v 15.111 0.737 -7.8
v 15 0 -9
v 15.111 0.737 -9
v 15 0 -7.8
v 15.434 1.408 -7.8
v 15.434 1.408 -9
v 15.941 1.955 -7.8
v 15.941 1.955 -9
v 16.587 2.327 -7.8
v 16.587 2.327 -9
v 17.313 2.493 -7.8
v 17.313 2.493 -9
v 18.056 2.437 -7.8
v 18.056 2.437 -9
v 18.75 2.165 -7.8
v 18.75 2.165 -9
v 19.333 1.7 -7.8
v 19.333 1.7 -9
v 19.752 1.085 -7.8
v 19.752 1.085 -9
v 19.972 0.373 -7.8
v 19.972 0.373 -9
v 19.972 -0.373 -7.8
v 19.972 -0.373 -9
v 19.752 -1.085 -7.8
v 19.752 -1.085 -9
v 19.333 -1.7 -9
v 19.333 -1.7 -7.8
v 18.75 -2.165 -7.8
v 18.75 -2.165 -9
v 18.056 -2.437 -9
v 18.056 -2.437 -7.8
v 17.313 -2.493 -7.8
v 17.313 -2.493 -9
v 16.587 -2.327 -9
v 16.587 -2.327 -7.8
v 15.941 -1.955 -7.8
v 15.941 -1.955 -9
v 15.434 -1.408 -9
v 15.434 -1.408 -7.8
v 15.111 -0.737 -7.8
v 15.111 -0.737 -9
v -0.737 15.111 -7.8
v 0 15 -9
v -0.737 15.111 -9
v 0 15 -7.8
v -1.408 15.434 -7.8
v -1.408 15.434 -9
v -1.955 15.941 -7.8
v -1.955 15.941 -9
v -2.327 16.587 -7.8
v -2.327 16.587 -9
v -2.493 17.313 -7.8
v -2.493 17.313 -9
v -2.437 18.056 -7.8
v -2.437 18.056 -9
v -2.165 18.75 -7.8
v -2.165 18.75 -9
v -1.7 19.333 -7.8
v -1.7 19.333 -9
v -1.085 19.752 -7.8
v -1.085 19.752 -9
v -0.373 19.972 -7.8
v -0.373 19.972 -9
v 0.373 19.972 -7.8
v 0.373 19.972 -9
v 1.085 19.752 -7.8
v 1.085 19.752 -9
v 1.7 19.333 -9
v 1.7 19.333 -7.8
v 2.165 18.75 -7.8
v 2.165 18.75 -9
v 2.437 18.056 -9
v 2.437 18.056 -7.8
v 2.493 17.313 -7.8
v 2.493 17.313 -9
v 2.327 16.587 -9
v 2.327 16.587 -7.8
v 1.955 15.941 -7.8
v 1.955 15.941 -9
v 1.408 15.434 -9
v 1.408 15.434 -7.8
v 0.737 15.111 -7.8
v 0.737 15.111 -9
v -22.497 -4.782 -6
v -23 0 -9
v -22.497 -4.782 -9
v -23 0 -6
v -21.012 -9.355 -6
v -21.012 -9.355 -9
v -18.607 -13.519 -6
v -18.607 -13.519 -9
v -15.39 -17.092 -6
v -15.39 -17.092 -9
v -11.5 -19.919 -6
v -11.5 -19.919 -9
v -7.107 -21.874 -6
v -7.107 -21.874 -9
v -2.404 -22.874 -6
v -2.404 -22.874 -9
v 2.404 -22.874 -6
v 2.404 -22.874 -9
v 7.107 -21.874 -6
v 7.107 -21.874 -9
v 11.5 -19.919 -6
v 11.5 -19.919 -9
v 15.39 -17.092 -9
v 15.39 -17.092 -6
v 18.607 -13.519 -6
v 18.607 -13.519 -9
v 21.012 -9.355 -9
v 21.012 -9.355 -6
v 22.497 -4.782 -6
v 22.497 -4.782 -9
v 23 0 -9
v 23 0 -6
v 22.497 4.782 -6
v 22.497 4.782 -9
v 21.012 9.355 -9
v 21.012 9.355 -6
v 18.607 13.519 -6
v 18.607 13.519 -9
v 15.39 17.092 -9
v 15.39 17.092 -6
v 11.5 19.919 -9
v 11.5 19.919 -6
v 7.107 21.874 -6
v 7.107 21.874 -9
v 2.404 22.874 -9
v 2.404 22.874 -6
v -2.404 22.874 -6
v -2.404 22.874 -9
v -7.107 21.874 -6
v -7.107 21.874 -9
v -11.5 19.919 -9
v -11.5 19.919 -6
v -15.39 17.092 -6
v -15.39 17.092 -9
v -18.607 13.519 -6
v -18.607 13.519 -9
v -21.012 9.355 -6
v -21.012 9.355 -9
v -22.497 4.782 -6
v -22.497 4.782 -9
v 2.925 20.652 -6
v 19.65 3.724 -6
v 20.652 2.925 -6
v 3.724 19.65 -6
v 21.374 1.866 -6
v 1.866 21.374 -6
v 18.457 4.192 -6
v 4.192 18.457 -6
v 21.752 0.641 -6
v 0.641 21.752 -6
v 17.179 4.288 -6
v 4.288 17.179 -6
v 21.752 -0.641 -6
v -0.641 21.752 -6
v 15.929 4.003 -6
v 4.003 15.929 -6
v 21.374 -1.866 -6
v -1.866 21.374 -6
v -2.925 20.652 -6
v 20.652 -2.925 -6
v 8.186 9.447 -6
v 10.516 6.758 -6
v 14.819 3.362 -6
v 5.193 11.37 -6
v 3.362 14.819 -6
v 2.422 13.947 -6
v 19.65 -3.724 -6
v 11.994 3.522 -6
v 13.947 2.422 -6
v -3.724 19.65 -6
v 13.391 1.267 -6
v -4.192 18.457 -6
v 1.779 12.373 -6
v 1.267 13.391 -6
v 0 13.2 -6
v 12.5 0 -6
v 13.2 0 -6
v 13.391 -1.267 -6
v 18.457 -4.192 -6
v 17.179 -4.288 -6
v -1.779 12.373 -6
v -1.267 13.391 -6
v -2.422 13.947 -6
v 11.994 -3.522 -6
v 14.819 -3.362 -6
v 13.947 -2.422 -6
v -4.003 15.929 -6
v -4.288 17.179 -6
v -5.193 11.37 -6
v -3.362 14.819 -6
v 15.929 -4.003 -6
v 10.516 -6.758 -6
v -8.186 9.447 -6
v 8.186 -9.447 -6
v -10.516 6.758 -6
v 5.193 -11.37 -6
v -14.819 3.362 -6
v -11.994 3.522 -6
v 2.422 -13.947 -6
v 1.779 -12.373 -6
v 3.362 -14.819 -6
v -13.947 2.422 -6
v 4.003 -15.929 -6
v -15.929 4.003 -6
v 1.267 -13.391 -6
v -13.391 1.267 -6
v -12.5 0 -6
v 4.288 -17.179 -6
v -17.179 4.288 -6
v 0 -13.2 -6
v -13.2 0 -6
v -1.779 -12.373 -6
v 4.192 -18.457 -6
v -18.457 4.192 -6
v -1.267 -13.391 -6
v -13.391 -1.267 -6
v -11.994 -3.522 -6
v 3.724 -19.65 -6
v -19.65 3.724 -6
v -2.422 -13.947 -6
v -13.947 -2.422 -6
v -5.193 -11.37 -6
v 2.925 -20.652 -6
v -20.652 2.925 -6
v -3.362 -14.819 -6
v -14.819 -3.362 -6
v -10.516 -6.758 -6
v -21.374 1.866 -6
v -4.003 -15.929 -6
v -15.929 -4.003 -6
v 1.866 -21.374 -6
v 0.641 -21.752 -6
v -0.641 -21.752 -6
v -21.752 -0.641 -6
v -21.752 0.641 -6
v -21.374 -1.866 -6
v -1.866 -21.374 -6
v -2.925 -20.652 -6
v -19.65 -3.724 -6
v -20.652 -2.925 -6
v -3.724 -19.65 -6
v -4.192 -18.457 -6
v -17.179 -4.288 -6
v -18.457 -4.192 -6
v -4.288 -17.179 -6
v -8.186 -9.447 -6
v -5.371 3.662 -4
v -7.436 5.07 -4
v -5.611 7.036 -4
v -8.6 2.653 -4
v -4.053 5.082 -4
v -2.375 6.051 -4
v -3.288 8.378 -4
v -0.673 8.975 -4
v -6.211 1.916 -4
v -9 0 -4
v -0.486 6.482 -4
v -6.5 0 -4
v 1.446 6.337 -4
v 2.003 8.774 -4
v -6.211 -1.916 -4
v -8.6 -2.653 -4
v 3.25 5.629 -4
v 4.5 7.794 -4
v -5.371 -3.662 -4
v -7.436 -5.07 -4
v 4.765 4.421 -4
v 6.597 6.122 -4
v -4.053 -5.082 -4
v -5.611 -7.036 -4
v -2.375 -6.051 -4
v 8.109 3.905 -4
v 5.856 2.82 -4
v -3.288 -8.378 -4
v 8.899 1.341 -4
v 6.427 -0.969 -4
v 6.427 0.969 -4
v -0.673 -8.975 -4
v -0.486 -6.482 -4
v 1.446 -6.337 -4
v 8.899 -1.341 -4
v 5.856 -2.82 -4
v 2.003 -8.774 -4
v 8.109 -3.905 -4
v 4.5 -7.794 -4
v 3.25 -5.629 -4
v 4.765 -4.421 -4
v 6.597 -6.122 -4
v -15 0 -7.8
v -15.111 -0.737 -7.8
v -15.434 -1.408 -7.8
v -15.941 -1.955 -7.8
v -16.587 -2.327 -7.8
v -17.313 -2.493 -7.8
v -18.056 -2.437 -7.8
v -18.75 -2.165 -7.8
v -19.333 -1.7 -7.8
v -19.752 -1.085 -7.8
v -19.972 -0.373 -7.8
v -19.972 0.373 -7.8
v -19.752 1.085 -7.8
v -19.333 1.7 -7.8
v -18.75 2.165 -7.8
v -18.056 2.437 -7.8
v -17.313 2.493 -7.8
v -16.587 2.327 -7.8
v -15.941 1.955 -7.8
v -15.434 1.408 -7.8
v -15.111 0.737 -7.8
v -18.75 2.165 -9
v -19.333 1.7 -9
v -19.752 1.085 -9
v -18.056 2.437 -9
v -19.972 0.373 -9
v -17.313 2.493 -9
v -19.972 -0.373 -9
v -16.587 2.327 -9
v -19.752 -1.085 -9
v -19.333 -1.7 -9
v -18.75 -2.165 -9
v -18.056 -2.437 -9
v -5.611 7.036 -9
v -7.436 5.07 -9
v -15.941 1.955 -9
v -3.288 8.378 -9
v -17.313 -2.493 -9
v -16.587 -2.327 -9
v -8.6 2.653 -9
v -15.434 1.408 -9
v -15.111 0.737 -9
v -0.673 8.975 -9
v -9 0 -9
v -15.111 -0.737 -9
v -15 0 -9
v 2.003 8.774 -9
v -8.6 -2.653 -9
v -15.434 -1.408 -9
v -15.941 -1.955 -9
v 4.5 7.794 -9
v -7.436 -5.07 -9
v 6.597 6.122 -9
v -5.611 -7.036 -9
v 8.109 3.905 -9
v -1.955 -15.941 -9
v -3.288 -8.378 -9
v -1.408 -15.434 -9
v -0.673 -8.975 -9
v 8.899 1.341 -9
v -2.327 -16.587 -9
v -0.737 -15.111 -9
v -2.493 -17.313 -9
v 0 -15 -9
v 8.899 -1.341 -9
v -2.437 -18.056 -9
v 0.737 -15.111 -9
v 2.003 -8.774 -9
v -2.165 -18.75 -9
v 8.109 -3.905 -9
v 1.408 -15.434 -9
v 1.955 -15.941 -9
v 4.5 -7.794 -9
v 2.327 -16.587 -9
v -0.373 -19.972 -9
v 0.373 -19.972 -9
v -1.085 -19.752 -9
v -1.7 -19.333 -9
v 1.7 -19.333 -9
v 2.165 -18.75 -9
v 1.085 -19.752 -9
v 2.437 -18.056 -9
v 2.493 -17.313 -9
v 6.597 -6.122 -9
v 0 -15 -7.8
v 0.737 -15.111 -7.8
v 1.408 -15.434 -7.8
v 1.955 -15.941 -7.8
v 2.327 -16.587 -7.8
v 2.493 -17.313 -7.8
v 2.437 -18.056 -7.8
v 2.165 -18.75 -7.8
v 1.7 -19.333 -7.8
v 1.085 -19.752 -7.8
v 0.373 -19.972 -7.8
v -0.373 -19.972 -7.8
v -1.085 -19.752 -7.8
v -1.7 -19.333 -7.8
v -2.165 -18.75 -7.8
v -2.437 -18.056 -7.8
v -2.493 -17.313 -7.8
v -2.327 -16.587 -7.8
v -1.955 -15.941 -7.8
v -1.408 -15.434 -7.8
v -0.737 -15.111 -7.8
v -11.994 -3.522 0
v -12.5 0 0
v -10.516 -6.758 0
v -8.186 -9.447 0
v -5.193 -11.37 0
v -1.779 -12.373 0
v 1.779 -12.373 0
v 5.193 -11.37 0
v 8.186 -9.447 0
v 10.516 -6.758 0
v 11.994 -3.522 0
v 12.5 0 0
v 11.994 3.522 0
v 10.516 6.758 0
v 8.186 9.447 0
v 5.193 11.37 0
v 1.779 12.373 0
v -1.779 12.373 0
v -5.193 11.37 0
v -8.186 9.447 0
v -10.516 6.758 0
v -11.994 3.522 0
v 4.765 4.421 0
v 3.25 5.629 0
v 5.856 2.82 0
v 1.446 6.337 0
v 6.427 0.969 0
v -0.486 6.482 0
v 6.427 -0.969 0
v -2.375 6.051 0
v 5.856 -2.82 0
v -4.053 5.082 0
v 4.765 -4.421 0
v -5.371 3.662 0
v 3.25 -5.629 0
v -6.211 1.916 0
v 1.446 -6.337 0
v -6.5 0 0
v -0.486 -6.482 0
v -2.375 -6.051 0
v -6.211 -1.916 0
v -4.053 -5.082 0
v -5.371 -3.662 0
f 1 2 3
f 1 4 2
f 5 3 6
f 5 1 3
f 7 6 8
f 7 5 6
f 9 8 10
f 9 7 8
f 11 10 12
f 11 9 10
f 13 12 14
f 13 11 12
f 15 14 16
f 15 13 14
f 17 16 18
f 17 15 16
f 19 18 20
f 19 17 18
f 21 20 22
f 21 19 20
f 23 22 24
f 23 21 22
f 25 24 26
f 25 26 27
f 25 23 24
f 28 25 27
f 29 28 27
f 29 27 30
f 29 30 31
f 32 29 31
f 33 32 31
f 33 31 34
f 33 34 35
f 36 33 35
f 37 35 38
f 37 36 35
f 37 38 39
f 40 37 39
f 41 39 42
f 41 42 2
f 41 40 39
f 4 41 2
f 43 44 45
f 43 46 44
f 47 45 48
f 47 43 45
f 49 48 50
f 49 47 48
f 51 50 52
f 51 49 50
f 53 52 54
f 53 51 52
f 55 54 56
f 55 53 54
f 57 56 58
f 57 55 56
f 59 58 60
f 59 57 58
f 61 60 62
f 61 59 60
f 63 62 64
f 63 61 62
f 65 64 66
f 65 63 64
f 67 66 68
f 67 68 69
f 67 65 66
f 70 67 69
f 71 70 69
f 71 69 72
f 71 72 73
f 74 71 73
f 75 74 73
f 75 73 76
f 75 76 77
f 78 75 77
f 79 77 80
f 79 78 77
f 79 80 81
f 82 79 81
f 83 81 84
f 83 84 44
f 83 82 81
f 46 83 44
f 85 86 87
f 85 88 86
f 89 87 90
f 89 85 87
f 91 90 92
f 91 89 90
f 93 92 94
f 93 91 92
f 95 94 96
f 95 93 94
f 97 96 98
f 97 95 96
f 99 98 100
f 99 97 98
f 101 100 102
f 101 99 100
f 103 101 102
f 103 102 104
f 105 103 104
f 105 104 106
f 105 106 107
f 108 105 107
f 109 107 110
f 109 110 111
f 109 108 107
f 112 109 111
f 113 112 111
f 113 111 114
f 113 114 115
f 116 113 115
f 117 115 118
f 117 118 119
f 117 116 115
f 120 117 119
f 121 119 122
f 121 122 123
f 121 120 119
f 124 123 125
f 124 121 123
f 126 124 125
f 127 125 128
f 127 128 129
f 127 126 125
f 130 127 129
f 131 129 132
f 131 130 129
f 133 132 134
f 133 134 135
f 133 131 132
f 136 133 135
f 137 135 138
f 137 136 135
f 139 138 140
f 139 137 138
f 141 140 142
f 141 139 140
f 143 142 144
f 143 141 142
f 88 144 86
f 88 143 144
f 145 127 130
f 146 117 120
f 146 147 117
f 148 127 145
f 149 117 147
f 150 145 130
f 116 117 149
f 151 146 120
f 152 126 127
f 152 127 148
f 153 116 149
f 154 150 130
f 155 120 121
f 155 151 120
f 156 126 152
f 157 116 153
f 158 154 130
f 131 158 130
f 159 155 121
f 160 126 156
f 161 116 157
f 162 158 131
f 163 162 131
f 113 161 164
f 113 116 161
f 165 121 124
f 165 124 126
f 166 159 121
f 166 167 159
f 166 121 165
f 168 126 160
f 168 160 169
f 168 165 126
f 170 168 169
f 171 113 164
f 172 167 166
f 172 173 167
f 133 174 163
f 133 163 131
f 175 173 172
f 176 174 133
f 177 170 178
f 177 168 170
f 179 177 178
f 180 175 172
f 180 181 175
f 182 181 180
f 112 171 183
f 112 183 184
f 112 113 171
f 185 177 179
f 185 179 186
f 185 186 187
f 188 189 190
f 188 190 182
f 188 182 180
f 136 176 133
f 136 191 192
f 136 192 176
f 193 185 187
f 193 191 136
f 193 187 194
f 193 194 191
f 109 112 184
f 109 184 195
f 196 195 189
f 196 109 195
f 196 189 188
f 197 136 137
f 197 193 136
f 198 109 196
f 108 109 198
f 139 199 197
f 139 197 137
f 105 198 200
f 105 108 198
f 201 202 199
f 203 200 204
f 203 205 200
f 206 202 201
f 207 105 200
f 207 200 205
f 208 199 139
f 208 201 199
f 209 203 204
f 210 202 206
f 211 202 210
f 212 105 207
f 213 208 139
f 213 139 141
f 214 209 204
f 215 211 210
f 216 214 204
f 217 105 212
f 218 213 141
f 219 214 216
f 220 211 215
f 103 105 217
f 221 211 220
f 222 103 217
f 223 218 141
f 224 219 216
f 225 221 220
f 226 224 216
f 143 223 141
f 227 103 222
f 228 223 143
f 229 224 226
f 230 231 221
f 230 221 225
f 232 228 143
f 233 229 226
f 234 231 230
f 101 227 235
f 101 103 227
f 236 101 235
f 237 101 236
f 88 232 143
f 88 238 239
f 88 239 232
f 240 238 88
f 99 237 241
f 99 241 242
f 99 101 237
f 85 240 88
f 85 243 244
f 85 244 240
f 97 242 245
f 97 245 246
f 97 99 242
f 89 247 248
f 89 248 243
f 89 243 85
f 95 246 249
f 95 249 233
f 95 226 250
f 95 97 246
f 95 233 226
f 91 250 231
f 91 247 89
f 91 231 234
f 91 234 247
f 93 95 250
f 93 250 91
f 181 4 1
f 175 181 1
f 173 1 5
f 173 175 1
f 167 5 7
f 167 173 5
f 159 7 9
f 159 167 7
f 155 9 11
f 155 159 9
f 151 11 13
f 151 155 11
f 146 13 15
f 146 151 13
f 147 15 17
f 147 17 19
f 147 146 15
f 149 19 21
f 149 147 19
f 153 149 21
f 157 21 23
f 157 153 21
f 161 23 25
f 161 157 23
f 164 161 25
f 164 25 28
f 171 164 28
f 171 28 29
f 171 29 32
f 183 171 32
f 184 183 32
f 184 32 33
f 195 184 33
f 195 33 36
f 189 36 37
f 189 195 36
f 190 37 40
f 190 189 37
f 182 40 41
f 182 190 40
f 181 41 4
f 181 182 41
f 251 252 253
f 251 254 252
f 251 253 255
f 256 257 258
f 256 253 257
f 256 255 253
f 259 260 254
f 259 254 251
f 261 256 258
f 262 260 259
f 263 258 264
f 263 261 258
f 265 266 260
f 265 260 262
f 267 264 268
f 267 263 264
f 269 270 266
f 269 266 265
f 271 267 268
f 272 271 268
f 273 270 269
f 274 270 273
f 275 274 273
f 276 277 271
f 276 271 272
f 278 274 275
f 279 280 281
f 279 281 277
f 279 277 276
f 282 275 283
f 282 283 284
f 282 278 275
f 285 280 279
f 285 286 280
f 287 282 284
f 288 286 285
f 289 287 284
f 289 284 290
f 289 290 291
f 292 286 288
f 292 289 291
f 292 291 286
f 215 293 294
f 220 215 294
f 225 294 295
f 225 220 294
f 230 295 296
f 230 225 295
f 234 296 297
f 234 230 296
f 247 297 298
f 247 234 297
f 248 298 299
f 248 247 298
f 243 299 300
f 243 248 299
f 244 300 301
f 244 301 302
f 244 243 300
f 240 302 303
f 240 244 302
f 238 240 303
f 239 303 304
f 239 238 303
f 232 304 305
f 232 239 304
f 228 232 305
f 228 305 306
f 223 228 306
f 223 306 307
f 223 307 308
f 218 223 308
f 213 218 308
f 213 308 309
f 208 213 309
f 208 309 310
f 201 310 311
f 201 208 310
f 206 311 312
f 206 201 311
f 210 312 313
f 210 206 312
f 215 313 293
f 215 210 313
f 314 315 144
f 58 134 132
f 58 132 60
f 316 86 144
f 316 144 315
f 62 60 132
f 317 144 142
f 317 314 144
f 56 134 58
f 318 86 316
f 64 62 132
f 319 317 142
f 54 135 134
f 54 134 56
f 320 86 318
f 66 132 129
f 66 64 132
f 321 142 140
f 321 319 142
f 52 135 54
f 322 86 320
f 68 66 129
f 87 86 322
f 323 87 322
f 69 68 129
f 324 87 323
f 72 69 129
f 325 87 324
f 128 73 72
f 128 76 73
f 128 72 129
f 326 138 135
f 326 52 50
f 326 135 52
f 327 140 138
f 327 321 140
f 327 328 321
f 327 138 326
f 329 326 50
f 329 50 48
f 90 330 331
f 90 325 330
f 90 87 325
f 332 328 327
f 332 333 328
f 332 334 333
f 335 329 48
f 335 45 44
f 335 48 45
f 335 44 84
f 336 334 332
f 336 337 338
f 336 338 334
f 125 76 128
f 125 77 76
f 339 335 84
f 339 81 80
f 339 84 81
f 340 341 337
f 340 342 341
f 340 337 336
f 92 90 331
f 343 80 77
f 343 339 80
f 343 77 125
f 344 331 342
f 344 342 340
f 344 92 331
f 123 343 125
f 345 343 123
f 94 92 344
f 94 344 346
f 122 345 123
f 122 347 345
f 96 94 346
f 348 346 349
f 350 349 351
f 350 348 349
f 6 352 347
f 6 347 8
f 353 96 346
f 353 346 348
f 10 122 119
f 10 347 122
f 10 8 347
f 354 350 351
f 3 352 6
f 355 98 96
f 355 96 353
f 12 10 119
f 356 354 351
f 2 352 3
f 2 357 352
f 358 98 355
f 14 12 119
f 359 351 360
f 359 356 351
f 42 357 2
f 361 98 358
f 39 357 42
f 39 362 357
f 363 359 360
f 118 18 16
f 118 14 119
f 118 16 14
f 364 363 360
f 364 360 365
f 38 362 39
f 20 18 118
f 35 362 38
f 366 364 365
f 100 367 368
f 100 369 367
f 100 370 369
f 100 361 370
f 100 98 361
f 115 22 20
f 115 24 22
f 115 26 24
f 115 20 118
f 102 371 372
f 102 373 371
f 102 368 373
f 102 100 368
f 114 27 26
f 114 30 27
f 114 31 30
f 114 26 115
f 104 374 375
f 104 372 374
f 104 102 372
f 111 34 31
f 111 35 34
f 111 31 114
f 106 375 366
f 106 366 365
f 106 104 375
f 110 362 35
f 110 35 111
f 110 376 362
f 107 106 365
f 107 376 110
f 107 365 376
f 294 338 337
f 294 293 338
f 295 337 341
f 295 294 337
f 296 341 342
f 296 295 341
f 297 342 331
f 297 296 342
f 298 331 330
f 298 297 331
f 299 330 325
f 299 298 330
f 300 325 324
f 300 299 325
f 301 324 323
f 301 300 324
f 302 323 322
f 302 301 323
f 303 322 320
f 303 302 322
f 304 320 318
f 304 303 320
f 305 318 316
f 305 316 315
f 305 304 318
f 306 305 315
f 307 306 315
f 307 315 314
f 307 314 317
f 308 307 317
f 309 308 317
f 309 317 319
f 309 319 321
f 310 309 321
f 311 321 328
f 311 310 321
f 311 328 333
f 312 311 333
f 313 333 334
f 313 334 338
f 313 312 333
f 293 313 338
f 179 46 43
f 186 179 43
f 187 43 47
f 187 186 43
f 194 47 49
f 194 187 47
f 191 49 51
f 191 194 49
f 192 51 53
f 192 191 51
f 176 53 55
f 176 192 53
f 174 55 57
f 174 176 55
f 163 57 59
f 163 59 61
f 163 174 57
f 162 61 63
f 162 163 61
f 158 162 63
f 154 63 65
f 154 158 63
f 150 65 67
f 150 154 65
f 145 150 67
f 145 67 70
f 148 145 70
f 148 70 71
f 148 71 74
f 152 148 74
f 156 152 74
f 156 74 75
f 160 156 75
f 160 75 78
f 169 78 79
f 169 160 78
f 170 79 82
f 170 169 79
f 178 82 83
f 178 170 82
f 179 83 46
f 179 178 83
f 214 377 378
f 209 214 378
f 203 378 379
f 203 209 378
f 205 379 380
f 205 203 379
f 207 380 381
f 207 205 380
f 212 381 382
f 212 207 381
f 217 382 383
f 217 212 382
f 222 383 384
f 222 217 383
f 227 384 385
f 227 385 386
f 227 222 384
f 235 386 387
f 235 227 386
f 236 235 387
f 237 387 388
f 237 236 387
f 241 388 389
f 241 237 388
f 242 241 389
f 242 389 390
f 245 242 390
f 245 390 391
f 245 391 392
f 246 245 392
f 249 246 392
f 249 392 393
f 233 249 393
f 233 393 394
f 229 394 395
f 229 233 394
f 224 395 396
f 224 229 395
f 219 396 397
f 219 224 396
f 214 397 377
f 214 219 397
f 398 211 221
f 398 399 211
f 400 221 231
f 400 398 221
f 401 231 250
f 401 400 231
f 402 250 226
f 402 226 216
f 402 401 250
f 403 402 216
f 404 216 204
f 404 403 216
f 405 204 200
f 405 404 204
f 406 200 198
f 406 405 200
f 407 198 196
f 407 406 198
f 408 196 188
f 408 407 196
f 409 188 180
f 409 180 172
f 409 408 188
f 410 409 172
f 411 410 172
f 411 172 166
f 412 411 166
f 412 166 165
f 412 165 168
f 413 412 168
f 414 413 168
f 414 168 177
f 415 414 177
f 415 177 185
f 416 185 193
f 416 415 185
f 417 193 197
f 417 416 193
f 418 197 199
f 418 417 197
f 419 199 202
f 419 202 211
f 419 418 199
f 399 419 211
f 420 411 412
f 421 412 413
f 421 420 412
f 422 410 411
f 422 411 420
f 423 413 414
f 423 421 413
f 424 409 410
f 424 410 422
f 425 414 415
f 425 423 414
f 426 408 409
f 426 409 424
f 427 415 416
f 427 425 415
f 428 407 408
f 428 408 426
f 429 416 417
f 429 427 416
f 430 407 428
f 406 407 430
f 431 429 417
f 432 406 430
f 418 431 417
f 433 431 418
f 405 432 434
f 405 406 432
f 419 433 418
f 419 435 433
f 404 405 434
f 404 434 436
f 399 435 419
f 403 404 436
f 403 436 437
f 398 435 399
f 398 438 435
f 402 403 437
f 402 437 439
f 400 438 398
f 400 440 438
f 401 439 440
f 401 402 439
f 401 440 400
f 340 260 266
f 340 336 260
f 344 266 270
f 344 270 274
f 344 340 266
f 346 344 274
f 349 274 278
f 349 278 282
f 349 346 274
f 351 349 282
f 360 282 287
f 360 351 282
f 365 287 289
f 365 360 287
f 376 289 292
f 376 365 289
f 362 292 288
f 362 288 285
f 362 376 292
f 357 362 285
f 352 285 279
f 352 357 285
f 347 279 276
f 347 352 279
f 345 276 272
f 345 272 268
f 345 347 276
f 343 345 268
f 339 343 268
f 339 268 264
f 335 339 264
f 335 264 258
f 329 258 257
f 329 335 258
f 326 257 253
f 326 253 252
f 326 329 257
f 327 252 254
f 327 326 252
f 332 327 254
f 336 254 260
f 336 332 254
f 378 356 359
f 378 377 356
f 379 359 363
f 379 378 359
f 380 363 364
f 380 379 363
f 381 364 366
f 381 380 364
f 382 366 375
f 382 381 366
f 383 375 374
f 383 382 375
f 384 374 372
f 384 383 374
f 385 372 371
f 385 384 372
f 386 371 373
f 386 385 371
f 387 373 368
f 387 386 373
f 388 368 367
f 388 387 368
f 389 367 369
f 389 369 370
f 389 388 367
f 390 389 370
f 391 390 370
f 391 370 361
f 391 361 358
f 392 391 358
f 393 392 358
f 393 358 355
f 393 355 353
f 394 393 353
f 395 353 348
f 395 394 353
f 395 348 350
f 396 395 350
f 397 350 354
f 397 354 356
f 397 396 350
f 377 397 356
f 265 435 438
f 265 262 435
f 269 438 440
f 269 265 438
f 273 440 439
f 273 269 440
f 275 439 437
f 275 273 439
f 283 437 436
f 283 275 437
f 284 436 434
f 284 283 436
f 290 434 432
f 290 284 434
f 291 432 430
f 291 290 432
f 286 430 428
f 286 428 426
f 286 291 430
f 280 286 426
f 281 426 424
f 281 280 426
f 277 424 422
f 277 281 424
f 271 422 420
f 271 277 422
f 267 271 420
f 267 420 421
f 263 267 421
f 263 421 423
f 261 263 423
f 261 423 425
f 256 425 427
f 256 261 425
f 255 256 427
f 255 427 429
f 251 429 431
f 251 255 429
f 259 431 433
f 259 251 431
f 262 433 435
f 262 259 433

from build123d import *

# Parameters (mm, degrees)
RIPETIZIONECIRCOLARE1_COUNT = 4


with BuildPart() as part:
    # Schizzo1 → Rivoluzione1 (revolve)
    with BuildSketch(Plane(origin=(0, 0, 0), x_dir=(1, 0, 0), z_dir=(0, 1, 0)), mode=Mode.PRIVATE) as rivoluzione1_sk:
        Polygon((6.5, 0), (6.5, 4), (9, 4), (9, 9), (23, 9), (23, 6), (12.5, 6), (12.5, 0), align=None)
    revolve(rivoluzione1_sk.sketch.rotate(Axis((0, 0, -7.574324324), (0, 0, 1)), 180), axis=Axis((0, 0, -7.574324324), (0, 0, 1)))

    # Schizzo4 → Foro svasato per Vite M6-2 (revolve, cut)
    with BuildSketch(Plane(origin=(0, 17.5, -6), x_dir=(0, -1, 0), z_dir=(1, 0, 0))):
        Polygon((0, 0), (0, 3), (2.5, 3), (2.5, 1.8), (4.3, 0), align=None)
    foro_svasato_per_vite_m6_2 = revolve(axis=Axis((0, 17.5, 0.35), (0, 0, -1)), mode=Mode.SUBTRACT)

    # RipetizioneCircolare1: Foro svasato per Vite M6-2 ×4 about axis
    ripetizionecircolare1_axis = Axis((0, 0, 0), (0, 0, 1))
    for i in range(1, RIPETIZIONECIRCOLARE1_COUNT):
        add(foro_svasato_per_vite_m6_2.rotate(ripetizionecircolare1_axis, i * 360 / RIPETIZIONECIRCOLARE1_COUNT), mode=Mode.SUBTRACT)


solid = part.part
